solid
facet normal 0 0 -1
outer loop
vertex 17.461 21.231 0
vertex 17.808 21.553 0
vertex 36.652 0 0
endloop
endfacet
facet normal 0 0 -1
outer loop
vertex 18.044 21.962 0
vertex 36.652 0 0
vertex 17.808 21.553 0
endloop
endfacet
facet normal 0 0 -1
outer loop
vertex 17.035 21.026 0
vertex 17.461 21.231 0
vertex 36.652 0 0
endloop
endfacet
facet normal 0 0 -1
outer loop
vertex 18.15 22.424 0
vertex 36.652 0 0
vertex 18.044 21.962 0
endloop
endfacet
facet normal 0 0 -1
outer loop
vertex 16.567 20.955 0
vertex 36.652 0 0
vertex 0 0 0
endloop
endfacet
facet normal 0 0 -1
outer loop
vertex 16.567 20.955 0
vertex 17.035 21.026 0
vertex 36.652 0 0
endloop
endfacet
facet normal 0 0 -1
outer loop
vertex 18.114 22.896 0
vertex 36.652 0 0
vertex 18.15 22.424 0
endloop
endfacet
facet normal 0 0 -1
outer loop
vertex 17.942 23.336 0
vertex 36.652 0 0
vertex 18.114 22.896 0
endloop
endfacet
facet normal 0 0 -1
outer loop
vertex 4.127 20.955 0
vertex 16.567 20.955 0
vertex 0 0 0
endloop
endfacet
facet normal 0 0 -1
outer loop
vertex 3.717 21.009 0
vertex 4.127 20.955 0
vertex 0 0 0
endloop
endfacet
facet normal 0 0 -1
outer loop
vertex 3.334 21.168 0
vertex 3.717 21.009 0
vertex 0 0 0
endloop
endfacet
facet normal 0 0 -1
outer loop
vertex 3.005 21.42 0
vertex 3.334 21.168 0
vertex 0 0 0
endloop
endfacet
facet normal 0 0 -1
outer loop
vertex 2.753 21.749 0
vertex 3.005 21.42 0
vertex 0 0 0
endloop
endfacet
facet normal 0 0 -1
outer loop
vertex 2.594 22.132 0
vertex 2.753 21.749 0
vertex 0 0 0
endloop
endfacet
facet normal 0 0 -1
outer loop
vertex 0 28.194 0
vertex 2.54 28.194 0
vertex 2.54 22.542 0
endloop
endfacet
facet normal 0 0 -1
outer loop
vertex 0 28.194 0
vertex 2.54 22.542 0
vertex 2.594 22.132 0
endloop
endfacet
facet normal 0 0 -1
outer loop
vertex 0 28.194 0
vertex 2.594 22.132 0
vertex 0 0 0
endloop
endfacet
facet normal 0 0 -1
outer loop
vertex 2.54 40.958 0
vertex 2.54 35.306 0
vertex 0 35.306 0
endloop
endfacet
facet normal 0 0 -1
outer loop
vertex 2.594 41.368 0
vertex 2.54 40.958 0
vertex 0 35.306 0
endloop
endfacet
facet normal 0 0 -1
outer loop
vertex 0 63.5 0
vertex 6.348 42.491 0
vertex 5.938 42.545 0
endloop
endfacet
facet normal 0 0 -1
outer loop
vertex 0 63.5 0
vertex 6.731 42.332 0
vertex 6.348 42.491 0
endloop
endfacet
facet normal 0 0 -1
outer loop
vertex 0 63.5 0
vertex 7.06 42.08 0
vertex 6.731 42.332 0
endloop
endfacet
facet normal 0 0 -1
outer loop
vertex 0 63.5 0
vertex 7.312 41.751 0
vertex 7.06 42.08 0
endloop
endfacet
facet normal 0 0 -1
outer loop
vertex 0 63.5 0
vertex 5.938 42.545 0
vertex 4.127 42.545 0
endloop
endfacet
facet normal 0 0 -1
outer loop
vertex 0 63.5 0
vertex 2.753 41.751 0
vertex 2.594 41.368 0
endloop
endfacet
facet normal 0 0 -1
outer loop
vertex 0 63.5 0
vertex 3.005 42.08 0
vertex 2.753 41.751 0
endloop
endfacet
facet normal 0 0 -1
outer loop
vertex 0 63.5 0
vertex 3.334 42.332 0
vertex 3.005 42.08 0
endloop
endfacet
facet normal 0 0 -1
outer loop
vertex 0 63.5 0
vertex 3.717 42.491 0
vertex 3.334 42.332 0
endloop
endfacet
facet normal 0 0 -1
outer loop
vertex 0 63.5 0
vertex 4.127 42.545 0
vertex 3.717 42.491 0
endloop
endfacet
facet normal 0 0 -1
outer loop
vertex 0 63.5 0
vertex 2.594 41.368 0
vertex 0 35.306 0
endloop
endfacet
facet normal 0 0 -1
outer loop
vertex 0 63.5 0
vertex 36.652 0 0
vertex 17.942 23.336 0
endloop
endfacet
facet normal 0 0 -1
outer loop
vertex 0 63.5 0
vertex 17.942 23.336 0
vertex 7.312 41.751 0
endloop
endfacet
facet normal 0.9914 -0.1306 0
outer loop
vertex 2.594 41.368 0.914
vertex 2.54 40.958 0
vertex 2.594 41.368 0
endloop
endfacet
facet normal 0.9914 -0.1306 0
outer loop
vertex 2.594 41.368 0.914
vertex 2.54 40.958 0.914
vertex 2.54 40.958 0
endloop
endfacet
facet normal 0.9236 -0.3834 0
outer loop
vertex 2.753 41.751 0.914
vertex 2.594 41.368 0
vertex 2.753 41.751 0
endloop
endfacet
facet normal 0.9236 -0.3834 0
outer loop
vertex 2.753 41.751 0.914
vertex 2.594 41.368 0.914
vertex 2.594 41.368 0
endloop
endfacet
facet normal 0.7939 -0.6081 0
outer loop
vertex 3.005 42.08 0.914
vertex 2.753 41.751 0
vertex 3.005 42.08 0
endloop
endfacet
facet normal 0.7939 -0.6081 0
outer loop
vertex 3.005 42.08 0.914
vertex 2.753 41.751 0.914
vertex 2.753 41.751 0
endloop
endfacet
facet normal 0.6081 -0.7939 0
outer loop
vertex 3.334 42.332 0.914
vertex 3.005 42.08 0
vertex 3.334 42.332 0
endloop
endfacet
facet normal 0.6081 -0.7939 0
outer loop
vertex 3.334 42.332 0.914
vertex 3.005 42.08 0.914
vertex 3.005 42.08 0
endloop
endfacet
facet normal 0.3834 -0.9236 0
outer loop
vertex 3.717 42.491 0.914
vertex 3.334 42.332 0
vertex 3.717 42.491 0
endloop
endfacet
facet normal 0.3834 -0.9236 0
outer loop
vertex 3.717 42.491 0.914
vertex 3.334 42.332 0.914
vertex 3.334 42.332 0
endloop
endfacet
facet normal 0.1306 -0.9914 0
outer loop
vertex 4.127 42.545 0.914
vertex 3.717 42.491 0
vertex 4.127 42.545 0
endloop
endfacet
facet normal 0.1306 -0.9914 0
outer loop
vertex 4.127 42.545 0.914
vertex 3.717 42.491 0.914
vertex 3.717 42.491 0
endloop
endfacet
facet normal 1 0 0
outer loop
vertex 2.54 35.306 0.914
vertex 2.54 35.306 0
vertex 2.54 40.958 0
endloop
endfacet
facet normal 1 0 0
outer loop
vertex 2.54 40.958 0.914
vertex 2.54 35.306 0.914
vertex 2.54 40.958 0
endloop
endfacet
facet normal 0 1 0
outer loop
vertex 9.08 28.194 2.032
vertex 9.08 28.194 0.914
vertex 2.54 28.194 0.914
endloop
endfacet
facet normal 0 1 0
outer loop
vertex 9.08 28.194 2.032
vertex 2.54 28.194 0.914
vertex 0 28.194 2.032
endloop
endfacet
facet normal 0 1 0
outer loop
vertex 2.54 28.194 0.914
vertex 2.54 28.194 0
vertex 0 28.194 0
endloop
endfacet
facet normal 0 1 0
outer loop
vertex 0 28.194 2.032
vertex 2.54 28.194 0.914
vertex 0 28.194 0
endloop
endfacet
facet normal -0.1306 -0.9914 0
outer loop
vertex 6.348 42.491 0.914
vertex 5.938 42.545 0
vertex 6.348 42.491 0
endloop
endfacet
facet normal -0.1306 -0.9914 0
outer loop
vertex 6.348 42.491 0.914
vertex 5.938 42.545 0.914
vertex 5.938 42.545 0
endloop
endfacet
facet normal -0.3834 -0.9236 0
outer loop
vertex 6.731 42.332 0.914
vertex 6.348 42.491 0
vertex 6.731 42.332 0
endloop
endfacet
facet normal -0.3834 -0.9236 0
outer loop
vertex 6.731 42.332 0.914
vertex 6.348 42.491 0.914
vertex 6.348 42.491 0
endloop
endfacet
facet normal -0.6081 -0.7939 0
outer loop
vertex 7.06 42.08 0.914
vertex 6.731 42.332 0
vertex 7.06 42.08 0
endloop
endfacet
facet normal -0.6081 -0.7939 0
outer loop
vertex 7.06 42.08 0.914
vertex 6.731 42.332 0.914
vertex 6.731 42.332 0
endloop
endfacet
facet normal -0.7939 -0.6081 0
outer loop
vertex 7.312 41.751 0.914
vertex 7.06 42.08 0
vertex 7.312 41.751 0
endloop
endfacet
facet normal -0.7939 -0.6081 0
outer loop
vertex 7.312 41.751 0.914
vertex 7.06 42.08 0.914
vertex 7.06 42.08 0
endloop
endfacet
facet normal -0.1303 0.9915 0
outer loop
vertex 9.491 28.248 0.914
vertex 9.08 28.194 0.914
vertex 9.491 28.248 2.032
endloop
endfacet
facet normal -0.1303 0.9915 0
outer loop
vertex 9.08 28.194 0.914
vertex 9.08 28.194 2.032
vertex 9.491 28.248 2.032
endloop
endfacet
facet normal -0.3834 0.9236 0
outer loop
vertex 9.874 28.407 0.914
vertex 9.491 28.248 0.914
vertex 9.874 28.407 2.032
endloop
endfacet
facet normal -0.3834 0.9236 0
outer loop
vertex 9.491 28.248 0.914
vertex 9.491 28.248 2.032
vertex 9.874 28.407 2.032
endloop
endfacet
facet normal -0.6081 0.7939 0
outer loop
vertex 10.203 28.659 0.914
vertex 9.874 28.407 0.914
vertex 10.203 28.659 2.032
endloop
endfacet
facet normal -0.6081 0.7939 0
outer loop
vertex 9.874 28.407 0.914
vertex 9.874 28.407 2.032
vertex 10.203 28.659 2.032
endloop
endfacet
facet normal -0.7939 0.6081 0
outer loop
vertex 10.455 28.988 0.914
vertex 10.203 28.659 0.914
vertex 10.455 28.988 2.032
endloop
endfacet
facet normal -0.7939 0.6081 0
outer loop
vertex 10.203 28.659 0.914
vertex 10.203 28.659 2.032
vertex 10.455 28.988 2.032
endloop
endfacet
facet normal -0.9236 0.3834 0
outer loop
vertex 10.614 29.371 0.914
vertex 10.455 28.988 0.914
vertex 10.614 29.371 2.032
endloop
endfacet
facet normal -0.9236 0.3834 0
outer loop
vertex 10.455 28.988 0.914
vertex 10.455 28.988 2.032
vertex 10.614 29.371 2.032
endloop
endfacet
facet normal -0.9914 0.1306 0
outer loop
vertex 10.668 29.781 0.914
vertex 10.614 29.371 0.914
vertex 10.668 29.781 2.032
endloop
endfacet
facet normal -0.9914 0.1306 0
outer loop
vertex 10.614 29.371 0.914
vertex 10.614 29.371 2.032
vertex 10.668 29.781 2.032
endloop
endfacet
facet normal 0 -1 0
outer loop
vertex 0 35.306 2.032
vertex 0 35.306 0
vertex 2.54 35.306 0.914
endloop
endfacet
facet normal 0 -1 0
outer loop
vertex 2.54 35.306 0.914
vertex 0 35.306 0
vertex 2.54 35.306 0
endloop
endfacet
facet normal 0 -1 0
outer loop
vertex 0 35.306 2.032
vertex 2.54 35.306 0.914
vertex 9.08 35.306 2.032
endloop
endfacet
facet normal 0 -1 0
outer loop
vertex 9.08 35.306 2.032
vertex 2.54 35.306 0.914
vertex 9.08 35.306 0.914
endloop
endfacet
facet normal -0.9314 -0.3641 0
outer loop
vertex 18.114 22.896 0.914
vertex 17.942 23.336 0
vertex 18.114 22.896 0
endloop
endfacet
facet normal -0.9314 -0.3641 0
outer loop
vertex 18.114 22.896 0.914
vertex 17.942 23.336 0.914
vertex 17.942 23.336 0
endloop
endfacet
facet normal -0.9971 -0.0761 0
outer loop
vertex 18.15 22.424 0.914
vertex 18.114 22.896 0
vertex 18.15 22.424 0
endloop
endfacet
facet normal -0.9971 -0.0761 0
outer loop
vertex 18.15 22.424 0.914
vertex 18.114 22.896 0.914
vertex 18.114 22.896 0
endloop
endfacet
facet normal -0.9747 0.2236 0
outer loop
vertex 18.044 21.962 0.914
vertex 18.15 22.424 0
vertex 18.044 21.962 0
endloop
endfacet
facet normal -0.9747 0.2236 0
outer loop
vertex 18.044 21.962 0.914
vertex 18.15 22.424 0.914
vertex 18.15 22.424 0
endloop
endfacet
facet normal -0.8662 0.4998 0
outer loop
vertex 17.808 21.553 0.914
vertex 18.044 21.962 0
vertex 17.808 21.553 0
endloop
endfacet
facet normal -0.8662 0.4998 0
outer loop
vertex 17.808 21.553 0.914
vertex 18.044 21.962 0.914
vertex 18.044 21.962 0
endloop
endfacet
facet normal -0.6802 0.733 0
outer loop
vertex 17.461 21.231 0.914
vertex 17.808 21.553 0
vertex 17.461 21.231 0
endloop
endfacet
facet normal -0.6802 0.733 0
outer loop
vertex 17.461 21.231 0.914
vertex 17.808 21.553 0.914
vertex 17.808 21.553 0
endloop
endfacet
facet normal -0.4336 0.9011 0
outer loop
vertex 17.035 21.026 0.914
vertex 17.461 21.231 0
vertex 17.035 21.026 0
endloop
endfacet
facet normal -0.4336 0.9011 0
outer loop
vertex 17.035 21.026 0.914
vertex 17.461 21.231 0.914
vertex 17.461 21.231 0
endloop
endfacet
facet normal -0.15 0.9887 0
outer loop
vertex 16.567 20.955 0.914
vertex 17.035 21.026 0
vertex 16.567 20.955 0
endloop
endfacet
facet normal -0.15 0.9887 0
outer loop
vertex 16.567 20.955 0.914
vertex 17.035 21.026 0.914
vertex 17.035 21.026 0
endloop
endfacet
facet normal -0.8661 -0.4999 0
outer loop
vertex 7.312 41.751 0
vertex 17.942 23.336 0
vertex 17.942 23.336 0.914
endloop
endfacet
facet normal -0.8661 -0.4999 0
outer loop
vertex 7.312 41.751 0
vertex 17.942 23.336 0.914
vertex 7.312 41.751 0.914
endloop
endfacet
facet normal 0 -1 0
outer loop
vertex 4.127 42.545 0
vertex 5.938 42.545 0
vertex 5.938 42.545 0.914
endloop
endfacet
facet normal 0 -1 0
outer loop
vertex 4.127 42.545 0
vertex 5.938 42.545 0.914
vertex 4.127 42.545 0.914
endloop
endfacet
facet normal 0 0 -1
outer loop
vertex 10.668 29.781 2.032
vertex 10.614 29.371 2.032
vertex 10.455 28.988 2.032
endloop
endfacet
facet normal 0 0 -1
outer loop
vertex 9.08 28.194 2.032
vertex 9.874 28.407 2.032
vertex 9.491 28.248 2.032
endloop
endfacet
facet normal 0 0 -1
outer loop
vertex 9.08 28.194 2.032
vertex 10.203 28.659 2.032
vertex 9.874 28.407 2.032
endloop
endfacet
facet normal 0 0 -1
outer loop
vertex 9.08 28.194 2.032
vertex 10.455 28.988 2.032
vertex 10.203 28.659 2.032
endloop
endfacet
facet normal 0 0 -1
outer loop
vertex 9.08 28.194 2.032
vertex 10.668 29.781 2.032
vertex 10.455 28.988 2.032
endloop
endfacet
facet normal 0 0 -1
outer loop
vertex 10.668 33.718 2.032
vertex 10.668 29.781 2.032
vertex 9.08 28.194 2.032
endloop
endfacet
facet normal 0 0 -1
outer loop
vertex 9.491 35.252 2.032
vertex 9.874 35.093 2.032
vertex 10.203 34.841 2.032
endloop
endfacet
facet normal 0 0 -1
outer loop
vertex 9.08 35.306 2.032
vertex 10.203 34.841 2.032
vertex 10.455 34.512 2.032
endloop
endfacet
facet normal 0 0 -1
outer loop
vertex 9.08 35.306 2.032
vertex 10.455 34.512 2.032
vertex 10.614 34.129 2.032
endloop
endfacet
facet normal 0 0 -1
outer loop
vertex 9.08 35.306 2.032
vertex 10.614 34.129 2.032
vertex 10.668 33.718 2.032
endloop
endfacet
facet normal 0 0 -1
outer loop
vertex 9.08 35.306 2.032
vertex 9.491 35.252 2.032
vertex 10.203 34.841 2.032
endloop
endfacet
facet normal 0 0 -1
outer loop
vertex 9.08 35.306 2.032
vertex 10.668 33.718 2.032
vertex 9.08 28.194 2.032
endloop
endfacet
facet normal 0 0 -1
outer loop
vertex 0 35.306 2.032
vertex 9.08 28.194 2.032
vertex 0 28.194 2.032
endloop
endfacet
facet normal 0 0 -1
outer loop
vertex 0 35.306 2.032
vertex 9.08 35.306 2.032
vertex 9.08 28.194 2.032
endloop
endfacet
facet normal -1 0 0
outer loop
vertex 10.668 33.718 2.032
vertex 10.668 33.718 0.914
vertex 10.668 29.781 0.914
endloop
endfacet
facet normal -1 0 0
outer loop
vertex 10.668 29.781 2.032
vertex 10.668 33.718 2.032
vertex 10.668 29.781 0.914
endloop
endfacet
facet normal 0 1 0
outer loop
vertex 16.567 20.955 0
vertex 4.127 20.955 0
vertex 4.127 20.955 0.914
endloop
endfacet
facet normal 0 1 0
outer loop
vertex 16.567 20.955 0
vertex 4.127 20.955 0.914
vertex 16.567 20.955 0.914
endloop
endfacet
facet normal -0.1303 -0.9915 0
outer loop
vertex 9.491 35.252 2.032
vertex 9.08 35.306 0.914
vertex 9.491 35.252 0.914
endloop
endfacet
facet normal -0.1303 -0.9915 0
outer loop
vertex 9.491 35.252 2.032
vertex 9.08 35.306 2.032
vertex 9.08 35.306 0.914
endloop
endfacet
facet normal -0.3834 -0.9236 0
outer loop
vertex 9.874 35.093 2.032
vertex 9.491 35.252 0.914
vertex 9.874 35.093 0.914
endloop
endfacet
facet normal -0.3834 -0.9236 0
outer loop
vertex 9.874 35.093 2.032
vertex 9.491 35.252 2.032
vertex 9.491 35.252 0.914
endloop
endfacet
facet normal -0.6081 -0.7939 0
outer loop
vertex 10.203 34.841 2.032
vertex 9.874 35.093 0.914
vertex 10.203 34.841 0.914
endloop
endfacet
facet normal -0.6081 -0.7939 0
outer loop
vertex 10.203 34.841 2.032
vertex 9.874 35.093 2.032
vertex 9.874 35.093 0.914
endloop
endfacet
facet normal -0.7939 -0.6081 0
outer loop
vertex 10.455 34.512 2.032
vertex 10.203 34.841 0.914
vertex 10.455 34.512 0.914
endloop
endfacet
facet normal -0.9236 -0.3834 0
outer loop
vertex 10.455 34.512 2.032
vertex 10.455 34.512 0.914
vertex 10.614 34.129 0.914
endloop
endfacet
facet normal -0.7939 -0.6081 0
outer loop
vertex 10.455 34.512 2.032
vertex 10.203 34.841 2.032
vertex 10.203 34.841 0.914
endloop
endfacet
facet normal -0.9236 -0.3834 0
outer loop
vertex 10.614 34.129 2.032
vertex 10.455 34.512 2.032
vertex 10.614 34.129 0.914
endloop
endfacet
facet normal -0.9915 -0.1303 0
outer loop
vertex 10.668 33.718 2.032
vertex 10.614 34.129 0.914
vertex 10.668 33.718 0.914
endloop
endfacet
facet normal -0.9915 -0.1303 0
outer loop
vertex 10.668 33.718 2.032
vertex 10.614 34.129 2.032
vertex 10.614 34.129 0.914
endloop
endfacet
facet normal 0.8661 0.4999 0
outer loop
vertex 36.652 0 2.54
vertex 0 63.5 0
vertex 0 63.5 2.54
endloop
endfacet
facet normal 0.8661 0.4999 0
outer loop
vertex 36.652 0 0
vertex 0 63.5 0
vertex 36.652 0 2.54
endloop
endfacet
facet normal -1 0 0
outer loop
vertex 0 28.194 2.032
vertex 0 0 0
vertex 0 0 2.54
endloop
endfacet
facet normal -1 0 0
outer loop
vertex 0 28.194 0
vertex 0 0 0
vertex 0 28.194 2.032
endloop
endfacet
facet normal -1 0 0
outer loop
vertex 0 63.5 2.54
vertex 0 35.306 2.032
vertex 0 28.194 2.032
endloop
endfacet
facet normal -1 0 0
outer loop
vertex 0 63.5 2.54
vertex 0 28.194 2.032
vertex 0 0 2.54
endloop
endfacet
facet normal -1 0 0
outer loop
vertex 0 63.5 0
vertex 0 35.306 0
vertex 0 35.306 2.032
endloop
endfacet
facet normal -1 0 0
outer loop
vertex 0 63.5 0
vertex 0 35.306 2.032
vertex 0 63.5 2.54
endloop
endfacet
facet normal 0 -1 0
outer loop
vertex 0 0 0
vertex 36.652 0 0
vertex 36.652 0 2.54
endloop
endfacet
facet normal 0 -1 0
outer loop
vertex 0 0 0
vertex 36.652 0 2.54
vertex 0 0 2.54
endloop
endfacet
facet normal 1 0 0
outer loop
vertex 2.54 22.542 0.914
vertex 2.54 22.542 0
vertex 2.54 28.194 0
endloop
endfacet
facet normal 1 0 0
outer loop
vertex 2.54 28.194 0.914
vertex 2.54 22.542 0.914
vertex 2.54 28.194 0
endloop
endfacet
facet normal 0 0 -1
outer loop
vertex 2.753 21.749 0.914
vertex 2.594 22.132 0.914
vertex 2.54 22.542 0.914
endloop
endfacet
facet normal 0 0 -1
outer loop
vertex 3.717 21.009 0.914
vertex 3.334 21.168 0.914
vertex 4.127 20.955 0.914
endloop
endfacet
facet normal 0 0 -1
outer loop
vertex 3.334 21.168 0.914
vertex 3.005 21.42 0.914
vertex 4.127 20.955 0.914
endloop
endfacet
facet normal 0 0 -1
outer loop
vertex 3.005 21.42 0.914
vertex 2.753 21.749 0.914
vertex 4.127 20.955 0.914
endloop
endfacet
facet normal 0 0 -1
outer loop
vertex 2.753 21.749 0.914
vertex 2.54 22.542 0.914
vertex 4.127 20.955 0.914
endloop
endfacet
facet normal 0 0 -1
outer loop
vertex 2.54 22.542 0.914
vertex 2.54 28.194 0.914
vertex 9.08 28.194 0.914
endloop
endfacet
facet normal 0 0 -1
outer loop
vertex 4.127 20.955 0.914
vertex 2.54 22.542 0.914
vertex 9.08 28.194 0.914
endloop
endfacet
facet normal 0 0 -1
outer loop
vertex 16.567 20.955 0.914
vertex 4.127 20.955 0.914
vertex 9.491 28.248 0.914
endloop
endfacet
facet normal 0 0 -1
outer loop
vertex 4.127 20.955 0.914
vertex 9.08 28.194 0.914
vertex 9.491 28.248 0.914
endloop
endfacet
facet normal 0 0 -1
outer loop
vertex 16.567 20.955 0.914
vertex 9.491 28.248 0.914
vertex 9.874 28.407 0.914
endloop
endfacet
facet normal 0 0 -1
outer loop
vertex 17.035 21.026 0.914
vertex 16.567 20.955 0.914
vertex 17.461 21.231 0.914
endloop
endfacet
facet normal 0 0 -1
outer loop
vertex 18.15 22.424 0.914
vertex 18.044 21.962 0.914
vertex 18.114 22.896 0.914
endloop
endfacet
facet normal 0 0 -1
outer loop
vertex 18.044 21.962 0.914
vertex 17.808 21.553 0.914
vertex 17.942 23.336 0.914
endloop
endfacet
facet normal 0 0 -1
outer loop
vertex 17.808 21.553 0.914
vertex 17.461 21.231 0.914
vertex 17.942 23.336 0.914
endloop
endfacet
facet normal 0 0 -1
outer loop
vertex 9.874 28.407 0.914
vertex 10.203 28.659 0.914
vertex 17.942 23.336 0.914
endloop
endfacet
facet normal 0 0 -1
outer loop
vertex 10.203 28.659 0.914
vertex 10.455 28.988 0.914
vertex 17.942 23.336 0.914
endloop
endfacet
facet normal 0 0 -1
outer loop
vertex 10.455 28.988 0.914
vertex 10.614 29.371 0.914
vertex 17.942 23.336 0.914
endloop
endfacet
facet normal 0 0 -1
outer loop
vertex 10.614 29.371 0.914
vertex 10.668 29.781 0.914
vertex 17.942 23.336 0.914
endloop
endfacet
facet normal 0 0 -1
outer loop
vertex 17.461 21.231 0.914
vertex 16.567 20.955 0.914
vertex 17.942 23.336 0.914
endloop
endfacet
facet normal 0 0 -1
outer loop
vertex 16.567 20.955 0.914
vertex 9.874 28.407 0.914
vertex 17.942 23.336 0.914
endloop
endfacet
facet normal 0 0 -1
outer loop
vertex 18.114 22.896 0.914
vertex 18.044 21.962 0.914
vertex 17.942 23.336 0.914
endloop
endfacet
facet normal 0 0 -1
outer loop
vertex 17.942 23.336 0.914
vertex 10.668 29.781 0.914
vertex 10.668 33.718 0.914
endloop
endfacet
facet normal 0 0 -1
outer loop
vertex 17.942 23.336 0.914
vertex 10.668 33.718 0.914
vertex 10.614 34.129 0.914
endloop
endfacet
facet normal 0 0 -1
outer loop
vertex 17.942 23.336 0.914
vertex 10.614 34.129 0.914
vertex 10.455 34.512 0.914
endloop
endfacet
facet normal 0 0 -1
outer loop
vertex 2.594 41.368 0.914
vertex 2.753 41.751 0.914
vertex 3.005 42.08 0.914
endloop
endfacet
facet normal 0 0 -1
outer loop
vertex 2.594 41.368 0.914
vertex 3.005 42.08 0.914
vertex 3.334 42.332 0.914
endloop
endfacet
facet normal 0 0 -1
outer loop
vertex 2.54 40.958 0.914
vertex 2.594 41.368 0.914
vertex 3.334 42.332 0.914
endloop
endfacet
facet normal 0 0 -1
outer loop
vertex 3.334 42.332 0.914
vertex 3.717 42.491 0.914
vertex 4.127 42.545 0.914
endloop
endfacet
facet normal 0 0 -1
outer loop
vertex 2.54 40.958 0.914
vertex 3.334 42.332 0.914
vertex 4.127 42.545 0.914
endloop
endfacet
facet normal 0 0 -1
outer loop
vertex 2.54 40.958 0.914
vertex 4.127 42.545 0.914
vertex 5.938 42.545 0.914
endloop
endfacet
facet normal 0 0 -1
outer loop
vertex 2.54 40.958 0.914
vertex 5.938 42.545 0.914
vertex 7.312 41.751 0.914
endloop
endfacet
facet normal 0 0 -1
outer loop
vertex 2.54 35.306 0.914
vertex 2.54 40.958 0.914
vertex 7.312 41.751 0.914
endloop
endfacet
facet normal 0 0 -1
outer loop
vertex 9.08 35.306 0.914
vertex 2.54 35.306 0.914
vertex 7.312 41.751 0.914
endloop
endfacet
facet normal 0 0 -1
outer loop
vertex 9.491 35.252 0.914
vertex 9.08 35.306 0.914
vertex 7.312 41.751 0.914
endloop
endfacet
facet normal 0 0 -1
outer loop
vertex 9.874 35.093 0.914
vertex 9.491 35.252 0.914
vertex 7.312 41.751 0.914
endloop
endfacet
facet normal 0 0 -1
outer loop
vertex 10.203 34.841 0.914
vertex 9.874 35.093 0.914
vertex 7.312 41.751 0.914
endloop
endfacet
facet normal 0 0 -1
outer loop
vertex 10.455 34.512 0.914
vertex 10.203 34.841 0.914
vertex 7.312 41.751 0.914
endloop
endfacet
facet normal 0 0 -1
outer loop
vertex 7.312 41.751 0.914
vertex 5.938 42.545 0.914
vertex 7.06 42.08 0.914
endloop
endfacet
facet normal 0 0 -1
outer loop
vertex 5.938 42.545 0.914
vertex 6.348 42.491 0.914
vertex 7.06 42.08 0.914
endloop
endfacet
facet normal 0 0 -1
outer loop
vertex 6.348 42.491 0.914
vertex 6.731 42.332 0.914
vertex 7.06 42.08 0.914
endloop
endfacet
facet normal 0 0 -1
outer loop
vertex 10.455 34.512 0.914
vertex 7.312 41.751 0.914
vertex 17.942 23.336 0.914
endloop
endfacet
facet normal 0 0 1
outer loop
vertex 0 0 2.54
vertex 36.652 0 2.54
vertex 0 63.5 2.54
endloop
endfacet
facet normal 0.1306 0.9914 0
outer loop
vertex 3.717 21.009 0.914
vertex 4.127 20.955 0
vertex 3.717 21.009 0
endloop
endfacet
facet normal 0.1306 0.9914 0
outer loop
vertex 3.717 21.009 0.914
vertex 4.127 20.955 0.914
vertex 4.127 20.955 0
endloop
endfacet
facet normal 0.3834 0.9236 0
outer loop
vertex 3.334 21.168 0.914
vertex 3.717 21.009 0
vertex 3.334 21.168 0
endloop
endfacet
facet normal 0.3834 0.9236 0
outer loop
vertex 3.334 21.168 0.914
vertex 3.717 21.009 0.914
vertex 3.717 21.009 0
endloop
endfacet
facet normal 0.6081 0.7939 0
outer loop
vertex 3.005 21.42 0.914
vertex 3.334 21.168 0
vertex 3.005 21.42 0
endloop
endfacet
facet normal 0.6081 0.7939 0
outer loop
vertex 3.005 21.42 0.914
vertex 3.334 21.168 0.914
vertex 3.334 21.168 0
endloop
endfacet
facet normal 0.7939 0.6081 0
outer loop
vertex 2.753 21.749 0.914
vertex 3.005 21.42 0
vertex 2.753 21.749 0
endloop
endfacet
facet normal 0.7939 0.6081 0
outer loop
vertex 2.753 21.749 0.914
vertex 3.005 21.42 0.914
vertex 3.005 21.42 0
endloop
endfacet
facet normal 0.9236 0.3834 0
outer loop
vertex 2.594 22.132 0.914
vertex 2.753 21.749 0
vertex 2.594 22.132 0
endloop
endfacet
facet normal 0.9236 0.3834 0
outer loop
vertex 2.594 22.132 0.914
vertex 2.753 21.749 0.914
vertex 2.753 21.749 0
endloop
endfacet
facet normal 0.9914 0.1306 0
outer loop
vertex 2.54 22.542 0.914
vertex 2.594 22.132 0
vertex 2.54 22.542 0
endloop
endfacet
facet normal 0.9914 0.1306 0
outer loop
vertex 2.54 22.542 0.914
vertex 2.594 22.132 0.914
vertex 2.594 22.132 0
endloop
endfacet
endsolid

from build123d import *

# Parameters (mm, degrees)
EXTRUDE1_DEPTH = 2.54
EXTRUDE3_DEPTH = 2.032
EXTRUDE2_DEPTH = 0.9144
FILLET1_R      = 1.5875


with BuildPart() as part:
    # Sketch1 → Extrude1 (new body)
    with BuildSketch(Plane.XY):
        Polygon((0, 63.5), (36.6522, 0), (0, 0), align=None)
    extrude(amount=EXTRUDE1_DEPTH)

    # Sketch4 → Extrude3 (cut)
    with BuildSketch(Plane(origin=(0, 0, 0), x_dir=(-1, 0, 0), z_dir=(0, 0, -1))):
        Polygon((0, 31.75), (0, 35.306), (-10.668, 35.306), (-10.668, 28.194), (0, 28.194), align=None)
    extrude(amount=-EXTRUDE3_DEPTH, mode=Mode.SUBTRACT)

    # Sketch3 → Extrude2 (cut)
    with BuildSketch(Plane(origin=(0, 0, 0), x_dir=(-1, 0, 0), z_dir=(0, 0, -1))):
        Polygon((-2.54, 31.75), (-2.54, 20.955), (-19.315938, 20.955), (-6.85419, 42.545), (-2.54, 42.545), align=None)
    extrude(amount=-EXTRUDE2_DEPTH, mode=Mode.SUBTRACT)

    # Fillet1
    fillet1_edges = [part.edges().sort_by_distance(p)[0] for p in [
        (10.668, 28.194, 1.4732),
        (10.668, 35.306, 1.4732),
        (2.54, 42.545, 0.4572),
        (2.54, 20.955, 0.4572),
        (19.315938, 20.955, 0.4572),
        (6.85419, 42.545, 0.4572),
    ]]
    fillet(fillet1_edges, radius=FILLET1_R)


solid = part.part
